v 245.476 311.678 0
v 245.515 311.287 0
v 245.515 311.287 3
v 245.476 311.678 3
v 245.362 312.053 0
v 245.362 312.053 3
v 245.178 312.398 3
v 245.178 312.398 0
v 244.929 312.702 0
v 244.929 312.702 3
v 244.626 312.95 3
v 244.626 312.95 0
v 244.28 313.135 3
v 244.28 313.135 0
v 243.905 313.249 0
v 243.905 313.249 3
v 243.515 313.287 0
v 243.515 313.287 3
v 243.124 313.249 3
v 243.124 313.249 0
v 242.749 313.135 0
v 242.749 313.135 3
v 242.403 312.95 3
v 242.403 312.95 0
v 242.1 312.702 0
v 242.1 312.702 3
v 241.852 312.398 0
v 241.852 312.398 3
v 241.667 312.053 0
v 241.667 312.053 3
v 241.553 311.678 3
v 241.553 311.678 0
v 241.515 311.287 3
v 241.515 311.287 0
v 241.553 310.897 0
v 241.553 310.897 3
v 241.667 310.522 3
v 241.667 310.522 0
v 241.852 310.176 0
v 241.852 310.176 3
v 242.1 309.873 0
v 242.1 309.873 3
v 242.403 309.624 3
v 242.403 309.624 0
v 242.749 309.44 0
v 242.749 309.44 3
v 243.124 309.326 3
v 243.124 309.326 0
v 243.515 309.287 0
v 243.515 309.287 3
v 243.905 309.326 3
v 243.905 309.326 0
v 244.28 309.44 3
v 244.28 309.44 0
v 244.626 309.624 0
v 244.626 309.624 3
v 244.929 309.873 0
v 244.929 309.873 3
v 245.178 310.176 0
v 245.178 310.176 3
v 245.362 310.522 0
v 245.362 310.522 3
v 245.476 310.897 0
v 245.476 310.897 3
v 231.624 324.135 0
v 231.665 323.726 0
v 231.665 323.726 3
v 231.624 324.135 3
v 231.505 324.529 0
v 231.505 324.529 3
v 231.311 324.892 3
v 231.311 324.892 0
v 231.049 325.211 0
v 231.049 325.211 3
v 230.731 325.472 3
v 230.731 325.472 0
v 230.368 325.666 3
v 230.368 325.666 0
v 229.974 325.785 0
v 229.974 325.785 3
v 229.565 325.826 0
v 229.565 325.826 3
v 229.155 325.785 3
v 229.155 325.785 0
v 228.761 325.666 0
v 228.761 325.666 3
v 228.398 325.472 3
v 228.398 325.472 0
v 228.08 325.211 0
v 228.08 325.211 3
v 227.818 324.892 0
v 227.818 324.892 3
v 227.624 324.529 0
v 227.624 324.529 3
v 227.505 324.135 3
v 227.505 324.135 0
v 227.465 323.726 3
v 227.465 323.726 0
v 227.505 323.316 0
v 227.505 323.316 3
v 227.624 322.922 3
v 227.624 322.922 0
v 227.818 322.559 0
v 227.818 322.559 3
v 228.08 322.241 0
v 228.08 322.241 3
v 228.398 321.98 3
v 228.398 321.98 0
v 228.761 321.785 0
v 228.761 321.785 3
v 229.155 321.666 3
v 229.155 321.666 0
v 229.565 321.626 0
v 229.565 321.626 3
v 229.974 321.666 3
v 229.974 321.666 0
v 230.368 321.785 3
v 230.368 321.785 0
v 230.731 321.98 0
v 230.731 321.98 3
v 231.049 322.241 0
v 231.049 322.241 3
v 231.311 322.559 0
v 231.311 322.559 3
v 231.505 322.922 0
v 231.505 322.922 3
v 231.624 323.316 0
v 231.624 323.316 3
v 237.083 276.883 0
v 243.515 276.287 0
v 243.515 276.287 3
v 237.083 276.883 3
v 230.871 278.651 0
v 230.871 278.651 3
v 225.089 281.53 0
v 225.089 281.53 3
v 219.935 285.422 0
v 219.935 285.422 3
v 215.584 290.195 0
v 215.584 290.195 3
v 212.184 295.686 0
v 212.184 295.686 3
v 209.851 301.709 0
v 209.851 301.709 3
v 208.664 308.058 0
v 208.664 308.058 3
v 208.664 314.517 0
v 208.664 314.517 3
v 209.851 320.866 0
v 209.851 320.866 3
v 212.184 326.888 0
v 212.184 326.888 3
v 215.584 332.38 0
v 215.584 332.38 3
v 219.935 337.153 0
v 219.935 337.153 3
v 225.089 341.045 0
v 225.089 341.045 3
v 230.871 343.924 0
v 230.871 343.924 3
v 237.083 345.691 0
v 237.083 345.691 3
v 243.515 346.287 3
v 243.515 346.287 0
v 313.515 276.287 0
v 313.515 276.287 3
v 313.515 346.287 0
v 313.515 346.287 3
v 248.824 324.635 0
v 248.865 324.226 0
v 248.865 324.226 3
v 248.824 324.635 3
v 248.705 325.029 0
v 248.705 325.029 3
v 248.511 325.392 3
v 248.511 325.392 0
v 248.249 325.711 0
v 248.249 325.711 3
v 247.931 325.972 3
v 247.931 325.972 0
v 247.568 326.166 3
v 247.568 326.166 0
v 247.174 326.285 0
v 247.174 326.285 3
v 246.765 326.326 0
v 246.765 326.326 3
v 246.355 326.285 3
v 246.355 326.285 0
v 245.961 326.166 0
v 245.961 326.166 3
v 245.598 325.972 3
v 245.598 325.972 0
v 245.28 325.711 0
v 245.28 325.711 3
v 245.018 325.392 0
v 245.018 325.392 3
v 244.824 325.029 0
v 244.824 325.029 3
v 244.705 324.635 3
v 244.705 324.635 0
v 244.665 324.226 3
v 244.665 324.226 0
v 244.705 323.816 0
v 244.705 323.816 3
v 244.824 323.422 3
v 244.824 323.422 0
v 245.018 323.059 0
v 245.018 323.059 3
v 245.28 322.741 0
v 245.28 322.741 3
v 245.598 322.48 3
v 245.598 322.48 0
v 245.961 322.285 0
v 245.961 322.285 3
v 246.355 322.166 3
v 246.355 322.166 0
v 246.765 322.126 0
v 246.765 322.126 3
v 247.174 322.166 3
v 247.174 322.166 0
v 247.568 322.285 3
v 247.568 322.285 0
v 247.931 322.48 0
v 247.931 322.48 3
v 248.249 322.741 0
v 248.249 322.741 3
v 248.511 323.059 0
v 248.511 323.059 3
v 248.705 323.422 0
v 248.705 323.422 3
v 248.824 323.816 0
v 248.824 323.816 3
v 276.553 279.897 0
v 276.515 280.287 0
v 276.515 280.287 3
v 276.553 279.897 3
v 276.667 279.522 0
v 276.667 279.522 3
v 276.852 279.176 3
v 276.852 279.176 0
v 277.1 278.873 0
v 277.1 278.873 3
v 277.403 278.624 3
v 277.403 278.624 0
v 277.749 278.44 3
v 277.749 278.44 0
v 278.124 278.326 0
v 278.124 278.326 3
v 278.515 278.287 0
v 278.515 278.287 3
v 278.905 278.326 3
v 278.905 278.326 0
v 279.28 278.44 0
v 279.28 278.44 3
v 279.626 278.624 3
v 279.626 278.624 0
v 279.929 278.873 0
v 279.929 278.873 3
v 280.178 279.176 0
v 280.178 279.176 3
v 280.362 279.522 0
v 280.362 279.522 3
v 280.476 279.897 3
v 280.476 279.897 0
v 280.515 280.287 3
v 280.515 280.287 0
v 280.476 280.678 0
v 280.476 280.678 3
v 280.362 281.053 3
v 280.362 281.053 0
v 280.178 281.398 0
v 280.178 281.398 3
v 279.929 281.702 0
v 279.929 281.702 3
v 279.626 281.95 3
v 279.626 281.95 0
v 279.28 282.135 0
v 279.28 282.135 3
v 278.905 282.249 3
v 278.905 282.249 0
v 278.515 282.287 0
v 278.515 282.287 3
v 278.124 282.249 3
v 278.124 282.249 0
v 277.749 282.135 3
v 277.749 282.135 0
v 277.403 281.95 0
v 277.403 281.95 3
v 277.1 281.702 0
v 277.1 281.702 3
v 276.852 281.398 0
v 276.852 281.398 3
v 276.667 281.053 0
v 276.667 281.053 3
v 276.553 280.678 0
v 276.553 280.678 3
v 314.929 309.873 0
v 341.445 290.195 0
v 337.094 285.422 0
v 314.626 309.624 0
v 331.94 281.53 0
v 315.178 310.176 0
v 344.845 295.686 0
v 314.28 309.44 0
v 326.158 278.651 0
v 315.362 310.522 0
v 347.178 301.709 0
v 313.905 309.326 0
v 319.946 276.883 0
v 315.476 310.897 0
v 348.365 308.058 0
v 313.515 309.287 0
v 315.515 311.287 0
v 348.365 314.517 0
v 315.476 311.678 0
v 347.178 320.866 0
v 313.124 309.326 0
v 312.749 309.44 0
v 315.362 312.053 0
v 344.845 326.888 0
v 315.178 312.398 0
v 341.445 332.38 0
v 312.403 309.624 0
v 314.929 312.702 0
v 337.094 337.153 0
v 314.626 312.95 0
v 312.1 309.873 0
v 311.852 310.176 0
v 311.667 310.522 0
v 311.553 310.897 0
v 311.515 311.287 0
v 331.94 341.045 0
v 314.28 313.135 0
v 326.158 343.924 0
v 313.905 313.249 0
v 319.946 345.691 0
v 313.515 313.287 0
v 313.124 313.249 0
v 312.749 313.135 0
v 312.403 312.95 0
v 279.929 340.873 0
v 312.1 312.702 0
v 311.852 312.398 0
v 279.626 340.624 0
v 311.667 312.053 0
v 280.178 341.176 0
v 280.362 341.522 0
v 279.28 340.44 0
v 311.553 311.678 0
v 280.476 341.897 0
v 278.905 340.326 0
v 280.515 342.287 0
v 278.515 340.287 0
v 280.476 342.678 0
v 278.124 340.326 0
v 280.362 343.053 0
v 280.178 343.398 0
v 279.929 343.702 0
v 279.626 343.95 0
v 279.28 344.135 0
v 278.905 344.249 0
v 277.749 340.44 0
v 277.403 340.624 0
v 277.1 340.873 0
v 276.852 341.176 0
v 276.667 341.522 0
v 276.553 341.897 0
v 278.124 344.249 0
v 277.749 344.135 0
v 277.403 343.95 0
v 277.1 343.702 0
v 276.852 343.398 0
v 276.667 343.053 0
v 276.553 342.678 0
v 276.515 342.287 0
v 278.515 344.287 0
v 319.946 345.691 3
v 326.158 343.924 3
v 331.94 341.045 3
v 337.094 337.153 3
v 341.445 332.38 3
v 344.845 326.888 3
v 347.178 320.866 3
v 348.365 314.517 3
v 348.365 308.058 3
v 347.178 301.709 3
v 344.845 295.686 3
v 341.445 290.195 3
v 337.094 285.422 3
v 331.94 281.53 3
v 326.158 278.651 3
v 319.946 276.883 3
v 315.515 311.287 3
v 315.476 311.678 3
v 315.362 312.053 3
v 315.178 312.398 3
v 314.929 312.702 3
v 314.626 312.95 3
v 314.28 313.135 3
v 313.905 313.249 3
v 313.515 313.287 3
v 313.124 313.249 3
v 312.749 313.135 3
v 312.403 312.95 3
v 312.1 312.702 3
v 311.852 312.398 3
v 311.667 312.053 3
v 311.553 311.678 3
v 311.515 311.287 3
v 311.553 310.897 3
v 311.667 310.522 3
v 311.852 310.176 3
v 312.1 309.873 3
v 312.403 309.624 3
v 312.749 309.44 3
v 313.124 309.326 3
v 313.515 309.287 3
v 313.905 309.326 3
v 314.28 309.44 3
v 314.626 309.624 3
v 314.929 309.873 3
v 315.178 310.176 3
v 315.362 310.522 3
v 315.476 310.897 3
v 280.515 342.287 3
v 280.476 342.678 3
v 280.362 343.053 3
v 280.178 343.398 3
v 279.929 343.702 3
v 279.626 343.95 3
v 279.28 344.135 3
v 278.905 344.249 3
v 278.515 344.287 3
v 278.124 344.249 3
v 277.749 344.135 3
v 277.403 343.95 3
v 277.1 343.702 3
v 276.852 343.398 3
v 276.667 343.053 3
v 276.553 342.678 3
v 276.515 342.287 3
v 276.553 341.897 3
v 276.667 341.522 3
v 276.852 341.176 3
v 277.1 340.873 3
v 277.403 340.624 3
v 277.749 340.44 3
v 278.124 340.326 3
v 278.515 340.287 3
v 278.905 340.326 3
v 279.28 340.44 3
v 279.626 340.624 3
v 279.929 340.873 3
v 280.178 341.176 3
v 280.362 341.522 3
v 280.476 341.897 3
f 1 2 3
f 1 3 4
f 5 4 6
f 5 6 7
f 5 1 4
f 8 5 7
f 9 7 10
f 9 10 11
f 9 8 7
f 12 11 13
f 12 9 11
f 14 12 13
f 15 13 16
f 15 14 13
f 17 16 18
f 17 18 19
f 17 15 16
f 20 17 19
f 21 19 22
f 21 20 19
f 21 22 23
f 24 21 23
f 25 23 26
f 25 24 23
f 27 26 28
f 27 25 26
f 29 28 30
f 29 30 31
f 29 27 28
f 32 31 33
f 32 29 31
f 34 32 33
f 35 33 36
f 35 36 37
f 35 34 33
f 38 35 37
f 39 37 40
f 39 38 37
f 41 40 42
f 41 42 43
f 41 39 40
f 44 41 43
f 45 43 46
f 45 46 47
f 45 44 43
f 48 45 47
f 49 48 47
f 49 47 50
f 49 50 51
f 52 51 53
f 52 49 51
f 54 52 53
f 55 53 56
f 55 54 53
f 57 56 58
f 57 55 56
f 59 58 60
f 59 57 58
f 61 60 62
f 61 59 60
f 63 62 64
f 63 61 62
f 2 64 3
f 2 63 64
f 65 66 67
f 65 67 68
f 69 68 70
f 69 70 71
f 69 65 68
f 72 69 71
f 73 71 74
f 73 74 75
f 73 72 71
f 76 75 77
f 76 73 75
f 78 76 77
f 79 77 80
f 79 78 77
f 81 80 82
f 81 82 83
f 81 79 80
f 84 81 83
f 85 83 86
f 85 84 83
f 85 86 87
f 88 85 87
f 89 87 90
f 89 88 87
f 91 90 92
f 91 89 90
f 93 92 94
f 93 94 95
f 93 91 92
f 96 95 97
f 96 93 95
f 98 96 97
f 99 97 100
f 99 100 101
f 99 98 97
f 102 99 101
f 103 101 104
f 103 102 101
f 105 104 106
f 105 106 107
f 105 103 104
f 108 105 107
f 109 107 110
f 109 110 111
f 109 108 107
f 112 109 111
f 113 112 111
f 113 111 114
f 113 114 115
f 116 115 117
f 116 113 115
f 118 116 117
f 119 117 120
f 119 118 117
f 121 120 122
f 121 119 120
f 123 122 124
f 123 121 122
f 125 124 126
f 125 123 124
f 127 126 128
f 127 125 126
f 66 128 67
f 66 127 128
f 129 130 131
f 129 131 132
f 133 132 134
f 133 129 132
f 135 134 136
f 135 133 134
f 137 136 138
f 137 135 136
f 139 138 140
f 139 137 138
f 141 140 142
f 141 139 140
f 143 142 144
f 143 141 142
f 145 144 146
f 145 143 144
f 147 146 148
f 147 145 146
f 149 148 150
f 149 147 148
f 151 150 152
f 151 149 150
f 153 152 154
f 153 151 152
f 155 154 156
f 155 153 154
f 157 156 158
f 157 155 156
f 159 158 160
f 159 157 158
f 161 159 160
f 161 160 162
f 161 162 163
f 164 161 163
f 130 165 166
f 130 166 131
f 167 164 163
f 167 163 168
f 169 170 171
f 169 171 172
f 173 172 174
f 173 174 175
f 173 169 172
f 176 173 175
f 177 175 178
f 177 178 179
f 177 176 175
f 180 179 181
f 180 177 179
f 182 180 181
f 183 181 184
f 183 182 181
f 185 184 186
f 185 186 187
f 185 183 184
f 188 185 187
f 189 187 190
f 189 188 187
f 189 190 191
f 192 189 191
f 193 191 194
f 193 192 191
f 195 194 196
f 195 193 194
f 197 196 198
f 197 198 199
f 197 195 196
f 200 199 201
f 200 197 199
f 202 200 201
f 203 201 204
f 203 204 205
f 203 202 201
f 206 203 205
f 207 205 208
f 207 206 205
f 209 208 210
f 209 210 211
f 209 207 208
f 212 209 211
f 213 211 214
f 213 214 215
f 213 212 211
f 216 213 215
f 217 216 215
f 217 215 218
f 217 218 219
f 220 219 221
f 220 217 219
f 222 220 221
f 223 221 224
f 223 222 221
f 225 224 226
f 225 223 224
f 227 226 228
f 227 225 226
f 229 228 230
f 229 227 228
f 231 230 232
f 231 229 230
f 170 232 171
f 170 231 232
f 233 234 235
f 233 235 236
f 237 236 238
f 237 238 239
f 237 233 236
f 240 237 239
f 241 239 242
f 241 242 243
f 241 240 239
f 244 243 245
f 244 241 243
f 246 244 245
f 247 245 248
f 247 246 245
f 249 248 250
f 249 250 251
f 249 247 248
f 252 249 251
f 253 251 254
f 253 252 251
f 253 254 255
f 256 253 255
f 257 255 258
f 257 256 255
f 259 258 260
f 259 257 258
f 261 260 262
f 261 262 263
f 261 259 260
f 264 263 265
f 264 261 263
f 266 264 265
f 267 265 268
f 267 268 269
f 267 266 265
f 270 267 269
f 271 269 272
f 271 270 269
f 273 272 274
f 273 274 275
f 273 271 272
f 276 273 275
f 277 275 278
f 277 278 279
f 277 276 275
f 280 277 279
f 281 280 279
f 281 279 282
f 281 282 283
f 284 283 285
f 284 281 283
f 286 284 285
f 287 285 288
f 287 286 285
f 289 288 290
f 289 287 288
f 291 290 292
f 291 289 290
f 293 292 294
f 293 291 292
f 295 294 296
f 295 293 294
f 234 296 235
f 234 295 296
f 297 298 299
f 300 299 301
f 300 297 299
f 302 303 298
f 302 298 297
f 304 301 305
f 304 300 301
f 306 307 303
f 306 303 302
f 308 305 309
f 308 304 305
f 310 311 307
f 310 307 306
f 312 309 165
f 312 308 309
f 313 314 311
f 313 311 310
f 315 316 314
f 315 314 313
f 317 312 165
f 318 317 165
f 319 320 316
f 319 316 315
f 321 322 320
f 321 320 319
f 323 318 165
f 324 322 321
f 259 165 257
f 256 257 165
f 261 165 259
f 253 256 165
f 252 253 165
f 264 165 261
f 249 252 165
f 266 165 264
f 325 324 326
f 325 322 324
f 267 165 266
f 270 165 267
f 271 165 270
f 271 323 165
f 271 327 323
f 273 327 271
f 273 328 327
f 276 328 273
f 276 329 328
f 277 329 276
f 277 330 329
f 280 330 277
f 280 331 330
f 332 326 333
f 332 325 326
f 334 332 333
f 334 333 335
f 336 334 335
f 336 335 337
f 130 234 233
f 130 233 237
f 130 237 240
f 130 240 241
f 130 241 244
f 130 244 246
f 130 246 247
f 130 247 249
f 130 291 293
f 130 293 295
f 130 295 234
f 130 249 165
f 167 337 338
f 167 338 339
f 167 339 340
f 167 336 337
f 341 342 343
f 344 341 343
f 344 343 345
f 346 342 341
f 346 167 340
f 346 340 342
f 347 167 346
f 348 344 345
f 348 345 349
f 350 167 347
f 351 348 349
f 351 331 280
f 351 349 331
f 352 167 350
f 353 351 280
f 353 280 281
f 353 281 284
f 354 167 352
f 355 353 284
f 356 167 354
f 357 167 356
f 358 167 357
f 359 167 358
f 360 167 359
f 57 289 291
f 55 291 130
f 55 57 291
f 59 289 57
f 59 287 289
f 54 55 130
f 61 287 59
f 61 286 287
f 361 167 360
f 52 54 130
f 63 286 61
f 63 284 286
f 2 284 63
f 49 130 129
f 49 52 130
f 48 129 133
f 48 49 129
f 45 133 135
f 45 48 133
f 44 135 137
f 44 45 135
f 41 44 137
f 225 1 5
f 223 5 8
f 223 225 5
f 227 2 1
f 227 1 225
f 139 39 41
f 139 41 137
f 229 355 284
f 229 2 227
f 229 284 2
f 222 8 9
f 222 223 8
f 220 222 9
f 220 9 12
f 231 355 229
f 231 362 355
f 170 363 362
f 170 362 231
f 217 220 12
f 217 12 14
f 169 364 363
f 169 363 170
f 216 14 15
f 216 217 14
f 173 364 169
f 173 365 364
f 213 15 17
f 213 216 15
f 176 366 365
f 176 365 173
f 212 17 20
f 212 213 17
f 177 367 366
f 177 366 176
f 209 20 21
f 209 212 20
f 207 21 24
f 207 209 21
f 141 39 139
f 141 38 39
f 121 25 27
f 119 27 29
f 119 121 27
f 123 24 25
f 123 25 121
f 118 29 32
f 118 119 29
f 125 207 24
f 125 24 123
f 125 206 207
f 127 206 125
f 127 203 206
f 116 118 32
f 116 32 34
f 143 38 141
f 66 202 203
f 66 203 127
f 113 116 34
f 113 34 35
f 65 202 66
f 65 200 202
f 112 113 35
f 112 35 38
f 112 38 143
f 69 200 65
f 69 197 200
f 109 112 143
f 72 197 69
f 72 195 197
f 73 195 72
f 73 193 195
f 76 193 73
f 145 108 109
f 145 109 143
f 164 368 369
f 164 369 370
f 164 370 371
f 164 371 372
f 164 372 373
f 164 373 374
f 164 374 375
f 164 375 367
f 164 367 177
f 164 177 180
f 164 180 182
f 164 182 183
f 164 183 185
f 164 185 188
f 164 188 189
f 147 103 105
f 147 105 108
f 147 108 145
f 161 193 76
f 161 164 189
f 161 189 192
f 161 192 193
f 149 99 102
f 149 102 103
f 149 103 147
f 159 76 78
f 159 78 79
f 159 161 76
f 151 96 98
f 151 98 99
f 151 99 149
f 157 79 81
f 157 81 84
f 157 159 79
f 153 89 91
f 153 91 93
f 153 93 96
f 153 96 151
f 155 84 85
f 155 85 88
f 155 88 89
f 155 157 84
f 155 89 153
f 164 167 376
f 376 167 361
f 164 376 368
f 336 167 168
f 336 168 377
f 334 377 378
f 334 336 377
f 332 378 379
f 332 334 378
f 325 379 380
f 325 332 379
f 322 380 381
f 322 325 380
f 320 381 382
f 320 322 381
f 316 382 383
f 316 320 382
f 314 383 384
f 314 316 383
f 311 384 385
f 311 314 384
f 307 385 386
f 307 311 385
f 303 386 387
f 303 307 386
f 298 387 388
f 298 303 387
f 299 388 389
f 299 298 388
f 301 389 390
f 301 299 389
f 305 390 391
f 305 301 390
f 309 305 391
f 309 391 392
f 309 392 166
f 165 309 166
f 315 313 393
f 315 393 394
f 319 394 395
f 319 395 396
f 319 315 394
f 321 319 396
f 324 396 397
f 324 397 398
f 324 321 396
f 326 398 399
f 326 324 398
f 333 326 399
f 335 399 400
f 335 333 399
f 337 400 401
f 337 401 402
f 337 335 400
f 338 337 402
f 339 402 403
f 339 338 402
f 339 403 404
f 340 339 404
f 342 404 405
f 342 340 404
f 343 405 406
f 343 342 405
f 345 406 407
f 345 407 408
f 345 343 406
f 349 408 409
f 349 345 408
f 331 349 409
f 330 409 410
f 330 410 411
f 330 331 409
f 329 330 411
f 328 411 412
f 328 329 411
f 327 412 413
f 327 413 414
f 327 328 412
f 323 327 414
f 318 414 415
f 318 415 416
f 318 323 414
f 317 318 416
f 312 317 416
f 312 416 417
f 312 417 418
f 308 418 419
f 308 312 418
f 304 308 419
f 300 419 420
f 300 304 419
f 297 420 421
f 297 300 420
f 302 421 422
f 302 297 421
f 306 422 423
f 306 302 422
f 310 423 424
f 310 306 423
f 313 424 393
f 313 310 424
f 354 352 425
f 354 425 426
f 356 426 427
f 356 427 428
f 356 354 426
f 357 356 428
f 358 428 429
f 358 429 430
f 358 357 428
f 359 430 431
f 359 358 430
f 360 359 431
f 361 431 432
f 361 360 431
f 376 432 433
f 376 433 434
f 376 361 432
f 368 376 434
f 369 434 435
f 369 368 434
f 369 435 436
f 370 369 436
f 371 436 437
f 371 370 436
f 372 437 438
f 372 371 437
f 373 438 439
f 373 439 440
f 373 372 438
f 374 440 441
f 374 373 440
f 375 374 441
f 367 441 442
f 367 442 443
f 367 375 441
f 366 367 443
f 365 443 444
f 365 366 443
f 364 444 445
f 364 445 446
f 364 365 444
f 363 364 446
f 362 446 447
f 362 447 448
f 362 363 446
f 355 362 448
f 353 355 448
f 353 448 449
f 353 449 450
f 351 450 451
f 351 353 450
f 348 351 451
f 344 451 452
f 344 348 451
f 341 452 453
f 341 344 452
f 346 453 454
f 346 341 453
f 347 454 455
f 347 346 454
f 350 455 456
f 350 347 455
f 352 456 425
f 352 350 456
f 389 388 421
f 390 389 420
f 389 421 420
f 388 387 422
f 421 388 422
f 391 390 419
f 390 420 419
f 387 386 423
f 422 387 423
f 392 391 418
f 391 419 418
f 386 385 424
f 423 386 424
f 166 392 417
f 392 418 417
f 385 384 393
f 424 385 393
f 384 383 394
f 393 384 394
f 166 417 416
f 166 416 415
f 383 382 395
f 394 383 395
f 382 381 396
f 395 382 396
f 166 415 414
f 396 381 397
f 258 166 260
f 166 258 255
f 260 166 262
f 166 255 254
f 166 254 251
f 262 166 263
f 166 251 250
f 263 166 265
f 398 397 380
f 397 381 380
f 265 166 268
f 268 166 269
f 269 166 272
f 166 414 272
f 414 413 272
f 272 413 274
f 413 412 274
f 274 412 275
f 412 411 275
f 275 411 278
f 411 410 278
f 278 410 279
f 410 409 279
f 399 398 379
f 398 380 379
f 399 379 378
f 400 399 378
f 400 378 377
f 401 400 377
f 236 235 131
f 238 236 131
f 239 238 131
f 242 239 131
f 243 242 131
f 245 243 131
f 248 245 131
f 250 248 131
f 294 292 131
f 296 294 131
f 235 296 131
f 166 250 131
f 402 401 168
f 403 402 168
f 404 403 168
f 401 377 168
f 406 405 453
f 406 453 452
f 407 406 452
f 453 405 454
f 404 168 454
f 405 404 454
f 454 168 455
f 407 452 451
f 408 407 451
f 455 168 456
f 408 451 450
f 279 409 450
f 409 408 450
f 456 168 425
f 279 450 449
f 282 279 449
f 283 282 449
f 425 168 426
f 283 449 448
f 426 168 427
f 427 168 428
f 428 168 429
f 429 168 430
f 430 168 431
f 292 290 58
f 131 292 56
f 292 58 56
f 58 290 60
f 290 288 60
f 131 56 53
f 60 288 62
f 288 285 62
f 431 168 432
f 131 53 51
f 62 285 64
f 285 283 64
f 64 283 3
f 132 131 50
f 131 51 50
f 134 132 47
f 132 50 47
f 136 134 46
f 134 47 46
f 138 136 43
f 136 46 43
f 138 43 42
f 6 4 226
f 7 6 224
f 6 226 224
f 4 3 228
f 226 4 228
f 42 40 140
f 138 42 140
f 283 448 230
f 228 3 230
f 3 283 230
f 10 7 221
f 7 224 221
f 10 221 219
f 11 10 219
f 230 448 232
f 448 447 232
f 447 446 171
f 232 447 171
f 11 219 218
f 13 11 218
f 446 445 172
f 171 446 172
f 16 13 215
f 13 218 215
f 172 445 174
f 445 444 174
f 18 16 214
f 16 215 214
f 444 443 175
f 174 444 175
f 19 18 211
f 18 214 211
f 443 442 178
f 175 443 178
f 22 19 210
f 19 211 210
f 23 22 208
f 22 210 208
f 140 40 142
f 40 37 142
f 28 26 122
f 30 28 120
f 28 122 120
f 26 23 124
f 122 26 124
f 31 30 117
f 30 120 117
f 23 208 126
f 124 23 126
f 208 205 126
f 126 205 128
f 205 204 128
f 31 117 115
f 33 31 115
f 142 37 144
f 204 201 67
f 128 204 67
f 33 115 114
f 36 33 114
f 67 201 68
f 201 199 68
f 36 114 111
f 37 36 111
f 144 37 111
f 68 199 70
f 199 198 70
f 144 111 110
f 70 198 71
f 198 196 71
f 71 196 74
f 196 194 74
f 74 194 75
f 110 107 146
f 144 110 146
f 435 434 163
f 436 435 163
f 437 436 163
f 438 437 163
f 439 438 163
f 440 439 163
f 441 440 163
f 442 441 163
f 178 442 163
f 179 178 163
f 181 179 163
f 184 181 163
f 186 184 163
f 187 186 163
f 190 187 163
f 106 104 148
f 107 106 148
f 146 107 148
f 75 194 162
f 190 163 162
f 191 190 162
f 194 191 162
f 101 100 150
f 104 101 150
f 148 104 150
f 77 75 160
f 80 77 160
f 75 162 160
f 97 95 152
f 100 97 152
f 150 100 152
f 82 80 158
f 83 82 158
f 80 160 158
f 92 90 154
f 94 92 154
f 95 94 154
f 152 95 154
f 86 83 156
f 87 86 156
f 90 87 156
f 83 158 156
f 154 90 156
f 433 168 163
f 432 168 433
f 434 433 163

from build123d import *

# Parameters (mm, degrees)
SKETCH1_R           = 2
SKETCH1_R_2         = 2.099997394
SKETCH1_R_3         = 2.100000418
BOSS_EXTRUDE1_DEPTH = 3


with BuildPart() as part:
    # Sketch1 → Boss-Extrude1 (new body)
    with BuildSketch(Plane.XY):
        with BuildLine():
            Line((243.514566495, 346.287321237), (313.514566495, 346.287321237))
            ThreePointArc((313.514566495, 346.287321237), (348.514566495, 311.287321237), (313.514566495, 276.287321237))
            Line((313.514566495, 276.287321237), (243.514566495, 276.287321237))
            ThreePointArc((243.514566495, 276.287321237), (208.514566495, 311.287321237), (243.514566495, 346.287321237))
        make_face()
        with Locations((243.514566495, 311.287321237)):
            Circle(SKETCH1_R, mode=Mode.SUBTRACT)
        with Locations((313.514566495, 311.287321237)):
            Circle(SKETCH1_R, mode=Mode.SUBTRACT)
        with Locations((246.764562225, 324.225588056)):
            Circle(SKETCH1_R_2, mode=Mode.SUBTRACT)
        with Locations((229.564568056, 323.725595013)):
            Circle(SKETCH1_R_3, mode=Mode.SUBTRACT)
        with Locations((278.514566495, 342.287321237)):
            Circle(SKETCH1_R, mode=Mode.SUBTRACT)
        with Locations(Location((278.514566495, 280.287321237, 0), (0, 0, 180))):
            Circle(SKETCH1_R, mode=Mode.SUBTRACT)
    extrude(amount=BOSS_EXTRUDE1_DEPTH)


solid = part.part
